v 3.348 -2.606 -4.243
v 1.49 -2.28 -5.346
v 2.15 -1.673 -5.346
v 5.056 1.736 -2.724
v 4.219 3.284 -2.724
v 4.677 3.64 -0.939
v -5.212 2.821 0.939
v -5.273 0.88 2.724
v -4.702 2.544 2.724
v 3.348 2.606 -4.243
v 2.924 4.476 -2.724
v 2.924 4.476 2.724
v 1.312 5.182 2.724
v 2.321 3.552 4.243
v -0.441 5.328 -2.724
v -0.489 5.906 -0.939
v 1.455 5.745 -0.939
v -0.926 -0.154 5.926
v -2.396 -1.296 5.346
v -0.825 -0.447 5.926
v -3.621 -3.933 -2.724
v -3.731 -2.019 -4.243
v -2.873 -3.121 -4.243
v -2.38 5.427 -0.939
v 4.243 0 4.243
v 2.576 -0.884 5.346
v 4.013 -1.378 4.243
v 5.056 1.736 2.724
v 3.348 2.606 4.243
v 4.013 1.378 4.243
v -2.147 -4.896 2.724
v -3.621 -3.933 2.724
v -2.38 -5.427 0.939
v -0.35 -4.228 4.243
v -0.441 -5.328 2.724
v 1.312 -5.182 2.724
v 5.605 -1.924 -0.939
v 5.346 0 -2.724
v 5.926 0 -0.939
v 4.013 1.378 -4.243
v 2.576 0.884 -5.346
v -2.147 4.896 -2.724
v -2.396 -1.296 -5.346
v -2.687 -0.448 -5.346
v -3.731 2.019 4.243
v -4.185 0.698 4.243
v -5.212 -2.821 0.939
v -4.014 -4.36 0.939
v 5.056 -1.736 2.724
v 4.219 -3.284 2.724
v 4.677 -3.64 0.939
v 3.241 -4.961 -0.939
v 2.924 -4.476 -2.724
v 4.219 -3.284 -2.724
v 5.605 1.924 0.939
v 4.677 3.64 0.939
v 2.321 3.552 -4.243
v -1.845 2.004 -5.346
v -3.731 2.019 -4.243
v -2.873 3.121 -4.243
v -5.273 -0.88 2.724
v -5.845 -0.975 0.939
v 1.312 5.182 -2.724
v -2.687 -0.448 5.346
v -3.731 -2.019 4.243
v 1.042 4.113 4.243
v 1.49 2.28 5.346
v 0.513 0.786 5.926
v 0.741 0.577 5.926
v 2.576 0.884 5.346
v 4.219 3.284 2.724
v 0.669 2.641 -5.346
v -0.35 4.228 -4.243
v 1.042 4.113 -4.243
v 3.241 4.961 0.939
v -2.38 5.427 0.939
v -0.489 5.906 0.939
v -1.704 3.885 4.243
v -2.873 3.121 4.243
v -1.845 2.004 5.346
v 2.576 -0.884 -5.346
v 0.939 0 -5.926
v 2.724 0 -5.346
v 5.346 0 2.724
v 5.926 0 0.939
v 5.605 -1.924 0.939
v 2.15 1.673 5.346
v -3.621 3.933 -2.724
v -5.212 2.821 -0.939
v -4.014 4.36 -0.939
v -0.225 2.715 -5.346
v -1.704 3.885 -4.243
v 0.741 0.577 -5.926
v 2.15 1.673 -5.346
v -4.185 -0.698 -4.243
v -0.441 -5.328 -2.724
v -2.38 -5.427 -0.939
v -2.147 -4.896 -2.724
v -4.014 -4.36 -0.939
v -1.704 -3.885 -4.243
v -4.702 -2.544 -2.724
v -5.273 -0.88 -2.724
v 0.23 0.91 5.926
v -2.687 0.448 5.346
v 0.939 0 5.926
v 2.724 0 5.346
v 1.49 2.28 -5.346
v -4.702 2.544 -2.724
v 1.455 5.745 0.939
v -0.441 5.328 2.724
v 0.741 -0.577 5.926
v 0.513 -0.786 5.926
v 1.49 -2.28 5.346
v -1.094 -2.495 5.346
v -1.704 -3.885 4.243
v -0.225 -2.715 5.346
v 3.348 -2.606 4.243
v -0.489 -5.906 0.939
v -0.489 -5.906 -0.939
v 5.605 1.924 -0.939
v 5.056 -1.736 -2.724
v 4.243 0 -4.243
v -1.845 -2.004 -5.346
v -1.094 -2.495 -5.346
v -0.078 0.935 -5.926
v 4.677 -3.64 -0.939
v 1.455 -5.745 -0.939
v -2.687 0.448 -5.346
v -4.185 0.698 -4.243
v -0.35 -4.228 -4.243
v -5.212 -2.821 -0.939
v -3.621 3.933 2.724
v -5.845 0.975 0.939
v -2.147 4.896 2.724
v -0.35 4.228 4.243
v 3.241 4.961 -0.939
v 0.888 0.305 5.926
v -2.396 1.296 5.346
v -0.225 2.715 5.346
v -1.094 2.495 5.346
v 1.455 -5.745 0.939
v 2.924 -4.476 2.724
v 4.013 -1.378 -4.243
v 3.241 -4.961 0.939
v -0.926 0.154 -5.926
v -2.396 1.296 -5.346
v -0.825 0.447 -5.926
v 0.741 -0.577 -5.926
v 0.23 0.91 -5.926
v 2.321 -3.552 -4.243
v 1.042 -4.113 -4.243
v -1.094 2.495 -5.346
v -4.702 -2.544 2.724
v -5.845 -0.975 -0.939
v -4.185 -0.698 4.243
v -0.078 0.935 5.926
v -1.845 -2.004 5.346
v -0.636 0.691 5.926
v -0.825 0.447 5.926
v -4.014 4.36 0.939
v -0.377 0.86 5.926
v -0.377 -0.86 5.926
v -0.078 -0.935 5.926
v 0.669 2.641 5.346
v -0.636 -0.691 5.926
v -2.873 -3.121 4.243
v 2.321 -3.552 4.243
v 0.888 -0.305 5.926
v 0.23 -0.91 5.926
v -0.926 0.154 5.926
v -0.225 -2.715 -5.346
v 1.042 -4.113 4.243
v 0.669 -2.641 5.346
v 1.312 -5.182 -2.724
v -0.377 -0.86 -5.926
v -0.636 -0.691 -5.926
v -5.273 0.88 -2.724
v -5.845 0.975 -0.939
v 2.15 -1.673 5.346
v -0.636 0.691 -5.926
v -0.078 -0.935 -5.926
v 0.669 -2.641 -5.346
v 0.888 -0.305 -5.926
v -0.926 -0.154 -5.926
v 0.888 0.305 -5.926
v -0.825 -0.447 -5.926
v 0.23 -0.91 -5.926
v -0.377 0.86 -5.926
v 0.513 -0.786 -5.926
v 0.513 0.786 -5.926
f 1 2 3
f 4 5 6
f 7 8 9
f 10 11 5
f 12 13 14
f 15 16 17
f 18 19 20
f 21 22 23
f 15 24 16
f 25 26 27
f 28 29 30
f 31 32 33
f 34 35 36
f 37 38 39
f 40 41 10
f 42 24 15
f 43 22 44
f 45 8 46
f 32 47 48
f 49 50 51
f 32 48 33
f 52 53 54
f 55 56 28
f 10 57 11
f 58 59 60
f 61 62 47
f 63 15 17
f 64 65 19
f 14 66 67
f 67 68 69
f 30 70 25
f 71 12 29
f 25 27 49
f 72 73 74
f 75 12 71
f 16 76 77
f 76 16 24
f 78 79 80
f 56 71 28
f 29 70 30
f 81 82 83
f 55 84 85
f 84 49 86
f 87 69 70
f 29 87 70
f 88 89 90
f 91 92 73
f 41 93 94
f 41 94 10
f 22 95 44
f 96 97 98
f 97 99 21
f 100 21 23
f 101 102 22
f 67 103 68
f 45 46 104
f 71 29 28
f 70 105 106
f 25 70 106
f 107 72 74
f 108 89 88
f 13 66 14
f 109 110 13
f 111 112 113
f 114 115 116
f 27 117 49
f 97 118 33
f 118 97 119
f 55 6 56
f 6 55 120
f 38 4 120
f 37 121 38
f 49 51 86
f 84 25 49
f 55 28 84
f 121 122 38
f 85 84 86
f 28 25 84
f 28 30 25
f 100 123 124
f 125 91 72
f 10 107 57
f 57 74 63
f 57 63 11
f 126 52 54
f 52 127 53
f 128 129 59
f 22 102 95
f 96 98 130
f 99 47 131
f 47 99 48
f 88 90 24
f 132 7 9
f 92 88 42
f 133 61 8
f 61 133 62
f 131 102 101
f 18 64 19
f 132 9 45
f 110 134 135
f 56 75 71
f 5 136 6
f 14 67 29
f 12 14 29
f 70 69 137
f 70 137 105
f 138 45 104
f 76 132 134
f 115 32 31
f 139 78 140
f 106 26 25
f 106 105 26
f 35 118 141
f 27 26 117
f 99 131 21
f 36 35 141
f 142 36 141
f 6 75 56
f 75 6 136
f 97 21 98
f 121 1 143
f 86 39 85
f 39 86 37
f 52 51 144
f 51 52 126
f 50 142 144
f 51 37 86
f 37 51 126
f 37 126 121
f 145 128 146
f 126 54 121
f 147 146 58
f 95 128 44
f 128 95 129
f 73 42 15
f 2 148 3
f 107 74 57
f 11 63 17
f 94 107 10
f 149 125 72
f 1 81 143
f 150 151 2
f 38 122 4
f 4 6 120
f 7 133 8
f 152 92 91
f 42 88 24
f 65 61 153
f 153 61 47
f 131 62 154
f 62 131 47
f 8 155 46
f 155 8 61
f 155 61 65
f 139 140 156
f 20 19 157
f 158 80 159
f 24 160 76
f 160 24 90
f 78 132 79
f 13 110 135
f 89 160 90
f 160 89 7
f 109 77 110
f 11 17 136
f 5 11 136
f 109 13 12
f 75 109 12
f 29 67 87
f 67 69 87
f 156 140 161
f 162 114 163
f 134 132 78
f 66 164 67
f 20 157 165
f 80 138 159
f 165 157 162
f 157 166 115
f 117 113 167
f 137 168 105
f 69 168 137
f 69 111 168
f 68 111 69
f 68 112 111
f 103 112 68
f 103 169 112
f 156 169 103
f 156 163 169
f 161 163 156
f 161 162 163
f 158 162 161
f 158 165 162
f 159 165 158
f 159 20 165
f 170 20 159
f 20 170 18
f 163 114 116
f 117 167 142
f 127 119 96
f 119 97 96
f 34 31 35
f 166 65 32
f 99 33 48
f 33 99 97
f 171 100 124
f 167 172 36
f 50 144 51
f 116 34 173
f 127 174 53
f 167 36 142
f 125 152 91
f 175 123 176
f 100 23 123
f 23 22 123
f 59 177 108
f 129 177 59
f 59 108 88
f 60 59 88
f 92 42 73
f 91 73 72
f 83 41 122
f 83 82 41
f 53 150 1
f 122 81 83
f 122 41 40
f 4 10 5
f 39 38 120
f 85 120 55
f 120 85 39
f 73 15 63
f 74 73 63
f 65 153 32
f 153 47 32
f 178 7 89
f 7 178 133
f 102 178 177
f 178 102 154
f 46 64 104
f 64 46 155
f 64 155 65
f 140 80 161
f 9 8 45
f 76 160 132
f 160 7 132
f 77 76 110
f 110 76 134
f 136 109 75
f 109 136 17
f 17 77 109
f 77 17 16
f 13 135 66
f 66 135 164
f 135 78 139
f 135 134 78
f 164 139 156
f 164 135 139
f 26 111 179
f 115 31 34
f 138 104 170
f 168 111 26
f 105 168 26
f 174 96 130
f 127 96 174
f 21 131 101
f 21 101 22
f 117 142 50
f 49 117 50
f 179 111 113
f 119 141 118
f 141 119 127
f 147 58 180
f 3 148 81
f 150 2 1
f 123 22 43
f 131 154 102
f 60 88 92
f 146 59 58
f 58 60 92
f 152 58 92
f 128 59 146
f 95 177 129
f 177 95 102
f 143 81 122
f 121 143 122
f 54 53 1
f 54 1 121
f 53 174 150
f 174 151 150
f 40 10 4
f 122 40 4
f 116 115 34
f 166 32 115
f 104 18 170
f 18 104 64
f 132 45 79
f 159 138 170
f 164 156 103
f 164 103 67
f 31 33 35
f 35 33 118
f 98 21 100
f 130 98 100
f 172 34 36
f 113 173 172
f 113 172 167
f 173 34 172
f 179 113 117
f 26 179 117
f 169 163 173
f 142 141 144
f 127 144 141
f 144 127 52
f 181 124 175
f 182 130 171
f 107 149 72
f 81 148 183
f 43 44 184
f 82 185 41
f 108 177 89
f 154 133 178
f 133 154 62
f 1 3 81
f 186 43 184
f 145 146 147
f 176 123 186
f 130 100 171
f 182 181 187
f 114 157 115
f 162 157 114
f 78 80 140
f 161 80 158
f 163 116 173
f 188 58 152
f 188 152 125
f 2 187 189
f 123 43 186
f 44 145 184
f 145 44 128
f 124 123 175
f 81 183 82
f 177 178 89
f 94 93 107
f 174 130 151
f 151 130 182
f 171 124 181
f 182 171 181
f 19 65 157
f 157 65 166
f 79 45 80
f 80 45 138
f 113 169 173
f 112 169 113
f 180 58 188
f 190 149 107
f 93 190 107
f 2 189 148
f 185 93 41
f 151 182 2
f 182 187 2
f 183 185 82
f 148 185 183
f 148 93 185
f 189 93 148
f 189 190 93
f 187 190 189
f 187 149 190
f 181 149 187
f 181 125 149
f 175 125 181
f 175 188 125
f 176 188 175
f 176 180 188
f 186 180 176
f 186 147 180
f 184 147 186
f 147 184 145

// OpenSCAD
// Generated by generate_scads.py
difference() {
  sphere(r=6);
  translate([-10,-20,20]) {
    sphere(r=8);
  }
}
